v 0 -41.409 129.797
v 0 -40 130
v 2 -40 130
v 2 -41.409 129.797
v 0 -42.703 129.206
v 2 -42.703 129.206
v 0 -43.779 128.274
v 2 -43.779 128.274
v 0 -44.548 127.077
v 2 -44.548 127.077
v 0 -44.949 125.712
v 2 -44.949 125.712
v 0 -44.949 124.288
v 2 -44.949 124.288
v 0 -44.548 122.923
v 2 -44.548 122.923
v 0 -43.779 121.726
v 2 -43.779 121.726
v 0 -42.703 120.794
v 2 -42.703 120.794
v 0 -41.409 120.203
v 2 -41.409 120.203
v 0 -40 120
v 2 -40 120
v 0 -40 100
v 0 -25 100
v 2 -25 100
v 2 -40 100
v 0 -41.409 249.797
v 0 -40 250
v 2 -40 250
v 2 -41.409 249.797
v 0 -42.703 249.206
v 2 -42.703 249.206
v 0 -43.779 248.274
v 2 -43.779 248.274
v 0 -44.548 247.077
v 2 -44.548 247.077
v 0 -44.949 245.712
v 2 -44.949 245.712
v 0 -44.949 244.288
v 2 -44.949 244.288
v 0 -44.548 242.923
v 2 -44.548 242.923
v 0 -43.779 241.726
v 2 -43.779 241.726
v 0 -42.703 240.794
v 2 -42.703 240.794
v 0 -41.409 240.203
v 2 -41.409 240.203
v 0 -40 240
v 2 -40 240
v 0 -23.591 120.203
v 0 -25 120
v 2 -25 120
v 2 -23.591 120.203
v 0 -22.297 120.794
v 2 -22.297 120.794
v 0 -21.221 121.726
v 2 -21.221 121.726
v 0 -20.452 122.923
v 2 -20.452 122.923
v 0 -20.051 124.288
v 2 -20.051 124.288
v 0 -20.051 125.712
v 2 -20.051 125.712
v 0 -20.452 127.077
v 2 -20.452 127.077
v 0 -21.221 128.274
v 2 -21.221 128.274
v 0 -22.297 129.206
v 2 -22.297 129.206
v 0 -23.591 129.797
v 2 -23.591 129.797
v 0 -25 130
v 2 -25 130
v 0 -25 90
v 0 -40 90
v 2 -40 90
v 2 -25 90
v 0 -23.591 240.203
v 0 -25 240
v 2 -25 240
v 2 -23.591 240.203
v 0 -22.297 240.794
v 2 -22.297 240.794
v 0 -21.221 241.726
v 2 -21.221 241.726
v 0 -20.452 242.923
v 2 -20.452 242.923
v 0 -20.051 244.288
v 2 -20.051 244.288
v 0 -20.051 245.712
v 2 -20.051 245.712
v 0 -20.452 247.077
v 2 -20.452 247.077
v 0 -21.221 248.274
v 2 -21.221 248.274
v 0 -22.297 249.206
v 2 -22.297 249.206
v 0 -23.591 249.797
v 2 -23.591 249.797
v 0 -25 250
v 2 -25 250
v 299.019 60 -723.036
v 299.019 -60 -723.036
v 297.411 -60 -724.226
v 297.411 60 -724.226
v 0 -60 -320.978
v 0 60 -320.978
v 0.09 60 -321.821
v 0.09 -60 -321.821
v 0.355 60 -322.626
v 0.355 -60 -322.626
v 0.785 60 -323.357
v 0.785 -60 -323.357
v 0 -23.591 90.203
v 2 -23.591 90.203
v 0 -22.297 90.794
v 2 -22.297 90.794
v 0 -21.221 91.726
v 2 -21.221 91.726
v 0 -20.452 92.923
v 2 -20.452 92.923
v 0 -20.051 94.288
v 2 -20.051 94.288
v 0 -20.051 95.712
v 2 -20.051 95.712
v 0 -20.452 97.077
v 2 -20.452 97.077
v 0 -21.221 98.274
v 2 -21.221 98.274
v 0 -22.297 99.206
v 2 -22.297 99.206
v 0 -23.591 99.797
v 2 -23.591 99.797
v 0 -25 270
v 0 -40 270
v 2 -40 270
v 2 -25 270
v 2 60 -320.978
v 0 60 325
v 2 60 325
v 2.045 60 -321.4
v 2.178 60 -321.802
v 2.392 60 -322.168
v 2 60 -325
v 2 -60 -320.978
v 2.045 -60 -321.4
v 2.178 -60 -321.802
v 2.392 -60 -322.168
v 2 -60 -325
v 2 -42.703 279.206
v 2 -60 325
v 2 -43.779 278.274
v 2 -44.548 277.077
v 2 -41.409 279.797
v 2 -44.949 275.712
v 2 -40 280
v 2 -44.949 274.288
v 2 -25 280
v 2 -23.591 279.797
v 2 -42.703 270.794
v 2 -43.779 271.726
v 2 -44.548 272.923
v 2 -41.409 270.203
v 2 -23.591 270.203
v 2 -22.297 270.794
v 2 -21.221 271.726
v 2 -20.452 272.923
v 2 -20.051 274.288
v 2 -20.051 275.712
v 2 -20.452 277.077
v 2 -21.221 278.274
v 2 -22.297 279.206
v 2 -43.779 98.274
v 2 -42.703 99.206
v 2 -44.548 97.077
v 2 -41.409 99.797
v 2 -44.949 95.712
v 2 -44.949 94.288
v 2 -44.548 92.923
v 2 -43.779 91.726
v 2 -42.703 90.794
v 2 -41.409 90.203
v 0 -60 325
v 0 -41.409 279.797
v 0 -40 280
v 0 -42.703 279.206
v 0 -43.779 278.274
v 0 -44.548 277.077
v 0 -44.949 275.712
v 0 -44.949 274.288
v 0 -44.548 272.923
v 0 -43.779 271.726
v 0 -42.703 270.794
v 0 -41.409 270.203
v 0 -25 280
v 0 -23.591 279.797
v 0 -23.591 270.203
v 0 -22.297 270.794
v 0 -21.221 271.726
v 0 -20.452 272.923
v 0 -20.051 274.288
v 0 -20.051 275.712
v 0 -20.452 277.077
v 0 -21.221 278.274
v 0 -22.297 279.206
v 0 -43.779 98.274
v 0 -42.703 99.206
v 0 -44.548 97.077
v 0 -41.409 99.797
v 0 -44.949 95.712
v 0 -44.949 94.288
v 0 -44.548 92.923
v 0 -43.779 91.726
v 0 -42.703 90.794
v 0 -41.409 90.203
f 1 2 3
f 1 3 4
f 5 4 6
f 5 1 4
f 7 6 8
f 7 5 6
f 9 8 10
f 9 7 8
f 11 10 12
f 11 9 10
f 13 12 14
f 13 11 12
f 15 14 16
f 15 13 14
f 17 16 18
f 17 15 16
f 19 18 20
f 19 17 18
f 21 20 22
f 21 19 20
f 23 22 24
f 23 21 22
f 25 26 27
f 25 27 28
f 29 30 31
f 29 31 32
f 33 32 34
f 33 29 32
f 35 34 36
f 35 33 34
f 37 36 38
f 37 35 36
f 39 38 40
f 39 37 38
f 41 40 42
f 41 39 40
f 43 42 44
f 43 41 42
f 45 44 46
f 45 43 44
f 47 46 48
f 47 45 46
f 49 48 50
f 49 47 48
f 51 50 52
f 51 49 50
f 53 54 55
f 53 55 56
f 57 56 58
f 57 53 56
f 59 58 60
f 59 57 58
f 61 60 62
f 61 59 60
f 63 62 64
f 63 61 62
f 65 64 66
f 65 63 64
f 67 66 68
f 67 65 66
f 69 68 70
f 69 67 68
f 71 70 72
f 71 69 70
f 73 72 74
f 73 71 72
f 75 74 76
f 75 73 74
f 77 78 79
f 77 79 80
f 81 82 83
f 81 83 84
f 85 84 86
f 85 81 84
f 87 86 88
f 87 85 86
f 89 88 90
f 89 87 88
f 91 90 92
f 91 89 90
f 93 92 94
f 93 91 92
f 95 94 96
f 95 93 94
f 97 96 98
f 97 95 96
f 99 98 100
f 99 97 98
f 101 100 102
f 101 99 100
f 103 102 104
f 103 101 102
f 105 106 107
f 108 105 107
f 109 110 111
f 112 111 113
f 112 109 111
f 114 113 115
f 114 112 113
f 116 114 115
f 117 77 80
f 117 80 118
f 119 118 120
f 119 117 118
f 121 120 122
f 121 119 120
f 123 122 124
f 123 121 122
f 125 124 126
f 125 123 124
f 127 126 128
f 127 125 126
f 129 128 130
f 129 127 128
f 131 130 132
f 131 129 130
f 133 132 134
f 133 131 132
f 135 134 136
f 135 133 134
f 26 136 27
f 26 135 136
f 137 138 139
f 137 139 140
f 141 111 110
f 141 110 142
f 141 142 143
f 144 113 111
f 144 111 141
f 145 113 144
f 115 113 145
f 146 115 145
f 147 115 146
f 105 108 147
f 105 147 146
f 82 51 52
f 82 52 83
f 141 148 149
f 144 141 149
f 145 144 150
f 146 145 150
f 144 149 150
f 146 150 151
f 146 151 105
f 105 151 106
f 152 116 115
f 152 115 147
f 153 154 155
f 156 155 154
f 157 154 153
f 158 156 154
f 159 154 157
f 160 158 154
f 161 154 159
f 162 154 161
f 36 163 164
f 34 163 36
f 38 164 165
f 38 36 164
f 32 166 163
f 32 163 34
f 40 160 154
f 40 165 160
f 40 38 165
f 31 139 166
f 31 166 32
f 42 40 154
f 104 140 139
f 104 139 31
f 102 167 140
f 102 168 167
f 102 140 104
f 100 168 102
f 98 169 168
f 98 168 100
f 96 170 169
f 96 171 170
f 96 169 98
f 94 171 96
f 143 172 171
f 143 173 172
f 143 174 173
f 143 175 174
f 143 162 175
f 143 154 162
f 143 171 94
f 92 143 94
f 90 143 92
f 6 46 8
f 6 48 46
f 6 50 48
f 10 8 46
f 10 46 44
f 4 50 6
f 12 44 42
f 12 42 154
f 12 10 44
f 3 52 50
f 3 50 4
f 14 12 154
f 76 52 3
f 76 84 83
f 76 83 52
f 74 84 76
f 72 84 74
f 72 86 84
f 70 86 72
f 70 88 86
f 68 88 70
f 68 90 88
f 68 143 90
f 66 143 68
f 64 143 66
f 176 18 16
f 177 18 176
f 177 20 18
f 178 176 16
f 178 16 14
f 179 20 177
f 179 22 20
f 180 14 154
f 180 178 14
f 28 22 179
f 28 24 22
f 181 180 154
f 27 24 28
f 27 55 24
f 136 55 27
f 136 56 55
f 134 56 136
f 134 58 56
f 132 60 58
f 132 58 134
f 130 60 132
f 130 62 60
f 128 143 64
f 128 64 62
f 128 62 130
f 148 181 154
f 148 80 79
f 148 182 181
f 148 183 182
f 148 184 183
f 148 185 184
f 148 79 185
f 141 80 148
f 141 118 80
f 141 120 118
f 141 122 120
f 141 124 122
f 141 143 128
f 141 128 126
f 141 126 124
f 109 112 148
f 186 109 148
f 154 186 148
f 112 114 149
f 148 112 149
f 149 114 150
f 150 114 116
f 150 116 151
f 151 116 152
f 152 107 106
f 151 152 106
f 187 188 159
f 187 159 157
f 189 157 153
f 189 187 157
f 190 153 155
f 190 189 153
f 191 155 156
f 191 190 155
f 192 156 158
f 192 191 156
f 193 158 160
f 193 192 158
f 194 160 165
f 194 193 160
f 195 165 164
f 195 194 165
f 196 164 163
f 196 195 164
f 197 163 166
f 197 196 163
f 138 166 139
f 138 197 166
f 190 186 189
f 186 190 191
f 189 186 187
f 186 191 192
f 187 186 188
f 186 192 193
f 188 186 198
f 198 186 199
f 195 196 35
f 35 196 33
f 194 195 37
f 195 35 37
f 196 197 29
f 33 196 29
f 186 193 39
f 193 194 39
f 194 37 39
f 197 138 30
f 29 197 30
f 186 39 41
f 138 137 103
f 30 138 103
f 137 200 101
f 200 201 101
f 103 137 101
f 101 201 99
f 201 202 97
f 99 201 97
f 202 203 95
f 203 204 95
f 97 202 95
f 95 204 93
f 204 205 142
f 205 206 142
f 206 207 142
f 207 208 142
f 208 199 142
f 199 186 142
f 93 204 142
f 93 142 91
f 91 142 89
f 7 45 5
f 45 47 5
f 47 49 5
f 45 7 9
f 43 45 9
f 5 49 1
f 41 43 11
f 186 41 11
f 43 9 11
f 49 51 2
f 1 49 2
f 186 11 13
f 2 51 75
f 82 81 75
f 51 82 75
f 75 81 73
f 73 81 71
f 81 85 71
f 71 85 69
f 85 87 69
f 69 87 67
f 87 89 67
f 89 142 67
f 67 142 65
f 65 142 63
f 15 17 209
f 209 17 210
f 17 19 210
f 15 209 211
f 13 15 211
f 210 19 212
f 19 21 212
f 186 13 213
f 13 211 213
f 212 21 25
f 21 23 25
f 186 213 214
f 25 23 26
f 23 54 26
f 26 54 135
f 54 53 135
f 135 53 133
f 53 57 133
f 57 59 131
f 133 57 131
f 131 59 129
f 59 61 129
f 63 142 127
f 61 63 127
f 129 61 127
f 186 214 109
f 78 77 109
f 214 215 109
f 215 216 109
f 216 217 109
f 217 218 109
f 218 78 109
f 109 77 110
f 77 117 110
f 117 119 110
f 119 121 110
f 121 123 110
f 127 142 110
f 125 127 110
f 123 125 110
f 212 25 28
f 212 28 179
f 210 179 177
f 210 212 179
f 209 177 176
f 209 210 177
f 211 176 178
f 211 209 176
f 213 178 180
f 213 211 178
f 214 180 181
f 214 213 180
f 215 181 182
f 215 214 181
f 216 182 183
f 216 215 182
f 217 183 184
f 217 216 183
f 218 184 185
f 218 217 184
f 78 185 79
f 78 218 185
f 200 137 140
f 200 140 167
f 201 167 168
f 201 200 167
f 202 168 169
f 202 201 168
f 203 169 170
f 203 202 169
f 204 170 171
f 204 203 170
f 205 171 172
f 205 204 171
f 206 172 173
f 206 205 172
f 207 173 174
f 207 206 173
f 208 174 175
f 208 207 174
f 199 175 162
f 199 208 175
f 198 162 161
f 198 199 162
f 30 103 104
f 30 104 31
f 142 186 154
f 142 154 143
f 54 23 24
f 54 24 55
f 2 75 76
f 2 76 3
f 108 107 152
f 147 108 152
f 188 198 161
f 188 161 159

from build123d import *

# Parameters (mm, degrees)
SKETCH2_W            = 650
SKETCH2_H            = 120
BASE_FLANGE1_DEPTH   = 2
EDGE_FLANGE1_START   = -60
EDGE_FLANGE1_DEPTH   = 120
EDGE_FLANGE1_2_DEPTH = 120
CUT_EXTRUDE1_DEPTH   = 2


# Read off the part's stored shape, not the designer's step: Edge-Flange1
# Sheet-metal steps are written as plain solids
with BuildPart() as part:
    # Sketch2 → Base-Flange1 (new body)
    with BuildSketch(Plane(origin=(0, 0, 0), x_dir=(0, 0, -1), z_dir=(1, 0, 0))):
        Rectangle(SKETCH2_W, SKETCH2_H)
    extrude(amount=BASE_FLANGE1_DEPTH)

    # Edge-Flange1 outline → Edge-Flange1 (cut)
    with BuildSketch(Plane(origin=(0, 0, 0), x_dir=(1, 0, 0), z_dir=(0, 1, 0)).offset(EDGE_FLANGE1_START)):
        with BuildLine():
            ThreePointArc((0, 320.978152936), (0.201203495, 322.230808162), (0.784572558, 323.357444083))
            Line((0.784572558, 323.357444083), (2, 325))
            Line((2, 325), (0, 325))
            Line((0, 325), (0, 320.978152936))
        make_face()
    extrude(amount=EDGE_FLANGE1_DEPTH, mode=Mode.SUBTRACT)

    # Edge-Flange1 2 outline → Edge-Flange1 2 (add)
    with BuildSketch(Plane(origin=(0, 0, 0), x_dir=(1, 0, 0), z_dir=(0, 1, 0)).offset(EDGE_FLANGE1_START)):
        with BuildLine():
            Line((297.411393376, 724.225585433), (2, 325))
            Line((2, 325), (2, 320.978152936))
            ThreePointArc((2, 320.978152936), (2.100601748, 321.604480549), (2.392286279, 322.167798509))
            Line((2.392286279, 322.167798509), (299.019107097, 723.035939859))
            Line((299.019107097, 723.035939859), (297.411393376, 724.225585433))
        make_face()
    extrude(amount=EDGE_FLANGE1_2_DEPTH)

    # Sketch10 → Cut-Extrude1 (cut)
    with BuildSketch(Plane.ZY):
        with BuildLine():
            Line((280, -25), (280, -40))
            ThreePointArc((280, -40), (275, -45), (270, -40))
            Line((270, -40), (270, -25))
            ThreePointArc((270, -25), (275, -20), (280, -25))
        make_face()
        with BuildLine():
            Line((250, -25), (250, -40))
            ThreePointArc((250, -40), (245, -45), (240, -40))
            Line((240, -40), (240, -25))
            ThreePointArc((240, -25), (245, -20), (250, -25))
        make_face()
        with BuildLine():
            Line((130, -25), (130, -40))
            ThreePointArc((130, -40), (125, -45), (120, -40))
            Line((120, -40), (120, -25))
            ThreePointArc((120, -25), (125, -20), (130, -25))
        make_face()
        with BuildLine():
            Line((100, -25), (100, -40))
            ThreePointArc((100, -40), (95, -45), (90, -40))
            Line((90, -40), (90, -25))
            ThreePointArc((90, -25), (95, -20), (100, -25))
        make_face()
    extrude(amount=-CUT_EXTRUDE1_DEPTH, mode=Mode.SUBTRACT)


solid = part.part
